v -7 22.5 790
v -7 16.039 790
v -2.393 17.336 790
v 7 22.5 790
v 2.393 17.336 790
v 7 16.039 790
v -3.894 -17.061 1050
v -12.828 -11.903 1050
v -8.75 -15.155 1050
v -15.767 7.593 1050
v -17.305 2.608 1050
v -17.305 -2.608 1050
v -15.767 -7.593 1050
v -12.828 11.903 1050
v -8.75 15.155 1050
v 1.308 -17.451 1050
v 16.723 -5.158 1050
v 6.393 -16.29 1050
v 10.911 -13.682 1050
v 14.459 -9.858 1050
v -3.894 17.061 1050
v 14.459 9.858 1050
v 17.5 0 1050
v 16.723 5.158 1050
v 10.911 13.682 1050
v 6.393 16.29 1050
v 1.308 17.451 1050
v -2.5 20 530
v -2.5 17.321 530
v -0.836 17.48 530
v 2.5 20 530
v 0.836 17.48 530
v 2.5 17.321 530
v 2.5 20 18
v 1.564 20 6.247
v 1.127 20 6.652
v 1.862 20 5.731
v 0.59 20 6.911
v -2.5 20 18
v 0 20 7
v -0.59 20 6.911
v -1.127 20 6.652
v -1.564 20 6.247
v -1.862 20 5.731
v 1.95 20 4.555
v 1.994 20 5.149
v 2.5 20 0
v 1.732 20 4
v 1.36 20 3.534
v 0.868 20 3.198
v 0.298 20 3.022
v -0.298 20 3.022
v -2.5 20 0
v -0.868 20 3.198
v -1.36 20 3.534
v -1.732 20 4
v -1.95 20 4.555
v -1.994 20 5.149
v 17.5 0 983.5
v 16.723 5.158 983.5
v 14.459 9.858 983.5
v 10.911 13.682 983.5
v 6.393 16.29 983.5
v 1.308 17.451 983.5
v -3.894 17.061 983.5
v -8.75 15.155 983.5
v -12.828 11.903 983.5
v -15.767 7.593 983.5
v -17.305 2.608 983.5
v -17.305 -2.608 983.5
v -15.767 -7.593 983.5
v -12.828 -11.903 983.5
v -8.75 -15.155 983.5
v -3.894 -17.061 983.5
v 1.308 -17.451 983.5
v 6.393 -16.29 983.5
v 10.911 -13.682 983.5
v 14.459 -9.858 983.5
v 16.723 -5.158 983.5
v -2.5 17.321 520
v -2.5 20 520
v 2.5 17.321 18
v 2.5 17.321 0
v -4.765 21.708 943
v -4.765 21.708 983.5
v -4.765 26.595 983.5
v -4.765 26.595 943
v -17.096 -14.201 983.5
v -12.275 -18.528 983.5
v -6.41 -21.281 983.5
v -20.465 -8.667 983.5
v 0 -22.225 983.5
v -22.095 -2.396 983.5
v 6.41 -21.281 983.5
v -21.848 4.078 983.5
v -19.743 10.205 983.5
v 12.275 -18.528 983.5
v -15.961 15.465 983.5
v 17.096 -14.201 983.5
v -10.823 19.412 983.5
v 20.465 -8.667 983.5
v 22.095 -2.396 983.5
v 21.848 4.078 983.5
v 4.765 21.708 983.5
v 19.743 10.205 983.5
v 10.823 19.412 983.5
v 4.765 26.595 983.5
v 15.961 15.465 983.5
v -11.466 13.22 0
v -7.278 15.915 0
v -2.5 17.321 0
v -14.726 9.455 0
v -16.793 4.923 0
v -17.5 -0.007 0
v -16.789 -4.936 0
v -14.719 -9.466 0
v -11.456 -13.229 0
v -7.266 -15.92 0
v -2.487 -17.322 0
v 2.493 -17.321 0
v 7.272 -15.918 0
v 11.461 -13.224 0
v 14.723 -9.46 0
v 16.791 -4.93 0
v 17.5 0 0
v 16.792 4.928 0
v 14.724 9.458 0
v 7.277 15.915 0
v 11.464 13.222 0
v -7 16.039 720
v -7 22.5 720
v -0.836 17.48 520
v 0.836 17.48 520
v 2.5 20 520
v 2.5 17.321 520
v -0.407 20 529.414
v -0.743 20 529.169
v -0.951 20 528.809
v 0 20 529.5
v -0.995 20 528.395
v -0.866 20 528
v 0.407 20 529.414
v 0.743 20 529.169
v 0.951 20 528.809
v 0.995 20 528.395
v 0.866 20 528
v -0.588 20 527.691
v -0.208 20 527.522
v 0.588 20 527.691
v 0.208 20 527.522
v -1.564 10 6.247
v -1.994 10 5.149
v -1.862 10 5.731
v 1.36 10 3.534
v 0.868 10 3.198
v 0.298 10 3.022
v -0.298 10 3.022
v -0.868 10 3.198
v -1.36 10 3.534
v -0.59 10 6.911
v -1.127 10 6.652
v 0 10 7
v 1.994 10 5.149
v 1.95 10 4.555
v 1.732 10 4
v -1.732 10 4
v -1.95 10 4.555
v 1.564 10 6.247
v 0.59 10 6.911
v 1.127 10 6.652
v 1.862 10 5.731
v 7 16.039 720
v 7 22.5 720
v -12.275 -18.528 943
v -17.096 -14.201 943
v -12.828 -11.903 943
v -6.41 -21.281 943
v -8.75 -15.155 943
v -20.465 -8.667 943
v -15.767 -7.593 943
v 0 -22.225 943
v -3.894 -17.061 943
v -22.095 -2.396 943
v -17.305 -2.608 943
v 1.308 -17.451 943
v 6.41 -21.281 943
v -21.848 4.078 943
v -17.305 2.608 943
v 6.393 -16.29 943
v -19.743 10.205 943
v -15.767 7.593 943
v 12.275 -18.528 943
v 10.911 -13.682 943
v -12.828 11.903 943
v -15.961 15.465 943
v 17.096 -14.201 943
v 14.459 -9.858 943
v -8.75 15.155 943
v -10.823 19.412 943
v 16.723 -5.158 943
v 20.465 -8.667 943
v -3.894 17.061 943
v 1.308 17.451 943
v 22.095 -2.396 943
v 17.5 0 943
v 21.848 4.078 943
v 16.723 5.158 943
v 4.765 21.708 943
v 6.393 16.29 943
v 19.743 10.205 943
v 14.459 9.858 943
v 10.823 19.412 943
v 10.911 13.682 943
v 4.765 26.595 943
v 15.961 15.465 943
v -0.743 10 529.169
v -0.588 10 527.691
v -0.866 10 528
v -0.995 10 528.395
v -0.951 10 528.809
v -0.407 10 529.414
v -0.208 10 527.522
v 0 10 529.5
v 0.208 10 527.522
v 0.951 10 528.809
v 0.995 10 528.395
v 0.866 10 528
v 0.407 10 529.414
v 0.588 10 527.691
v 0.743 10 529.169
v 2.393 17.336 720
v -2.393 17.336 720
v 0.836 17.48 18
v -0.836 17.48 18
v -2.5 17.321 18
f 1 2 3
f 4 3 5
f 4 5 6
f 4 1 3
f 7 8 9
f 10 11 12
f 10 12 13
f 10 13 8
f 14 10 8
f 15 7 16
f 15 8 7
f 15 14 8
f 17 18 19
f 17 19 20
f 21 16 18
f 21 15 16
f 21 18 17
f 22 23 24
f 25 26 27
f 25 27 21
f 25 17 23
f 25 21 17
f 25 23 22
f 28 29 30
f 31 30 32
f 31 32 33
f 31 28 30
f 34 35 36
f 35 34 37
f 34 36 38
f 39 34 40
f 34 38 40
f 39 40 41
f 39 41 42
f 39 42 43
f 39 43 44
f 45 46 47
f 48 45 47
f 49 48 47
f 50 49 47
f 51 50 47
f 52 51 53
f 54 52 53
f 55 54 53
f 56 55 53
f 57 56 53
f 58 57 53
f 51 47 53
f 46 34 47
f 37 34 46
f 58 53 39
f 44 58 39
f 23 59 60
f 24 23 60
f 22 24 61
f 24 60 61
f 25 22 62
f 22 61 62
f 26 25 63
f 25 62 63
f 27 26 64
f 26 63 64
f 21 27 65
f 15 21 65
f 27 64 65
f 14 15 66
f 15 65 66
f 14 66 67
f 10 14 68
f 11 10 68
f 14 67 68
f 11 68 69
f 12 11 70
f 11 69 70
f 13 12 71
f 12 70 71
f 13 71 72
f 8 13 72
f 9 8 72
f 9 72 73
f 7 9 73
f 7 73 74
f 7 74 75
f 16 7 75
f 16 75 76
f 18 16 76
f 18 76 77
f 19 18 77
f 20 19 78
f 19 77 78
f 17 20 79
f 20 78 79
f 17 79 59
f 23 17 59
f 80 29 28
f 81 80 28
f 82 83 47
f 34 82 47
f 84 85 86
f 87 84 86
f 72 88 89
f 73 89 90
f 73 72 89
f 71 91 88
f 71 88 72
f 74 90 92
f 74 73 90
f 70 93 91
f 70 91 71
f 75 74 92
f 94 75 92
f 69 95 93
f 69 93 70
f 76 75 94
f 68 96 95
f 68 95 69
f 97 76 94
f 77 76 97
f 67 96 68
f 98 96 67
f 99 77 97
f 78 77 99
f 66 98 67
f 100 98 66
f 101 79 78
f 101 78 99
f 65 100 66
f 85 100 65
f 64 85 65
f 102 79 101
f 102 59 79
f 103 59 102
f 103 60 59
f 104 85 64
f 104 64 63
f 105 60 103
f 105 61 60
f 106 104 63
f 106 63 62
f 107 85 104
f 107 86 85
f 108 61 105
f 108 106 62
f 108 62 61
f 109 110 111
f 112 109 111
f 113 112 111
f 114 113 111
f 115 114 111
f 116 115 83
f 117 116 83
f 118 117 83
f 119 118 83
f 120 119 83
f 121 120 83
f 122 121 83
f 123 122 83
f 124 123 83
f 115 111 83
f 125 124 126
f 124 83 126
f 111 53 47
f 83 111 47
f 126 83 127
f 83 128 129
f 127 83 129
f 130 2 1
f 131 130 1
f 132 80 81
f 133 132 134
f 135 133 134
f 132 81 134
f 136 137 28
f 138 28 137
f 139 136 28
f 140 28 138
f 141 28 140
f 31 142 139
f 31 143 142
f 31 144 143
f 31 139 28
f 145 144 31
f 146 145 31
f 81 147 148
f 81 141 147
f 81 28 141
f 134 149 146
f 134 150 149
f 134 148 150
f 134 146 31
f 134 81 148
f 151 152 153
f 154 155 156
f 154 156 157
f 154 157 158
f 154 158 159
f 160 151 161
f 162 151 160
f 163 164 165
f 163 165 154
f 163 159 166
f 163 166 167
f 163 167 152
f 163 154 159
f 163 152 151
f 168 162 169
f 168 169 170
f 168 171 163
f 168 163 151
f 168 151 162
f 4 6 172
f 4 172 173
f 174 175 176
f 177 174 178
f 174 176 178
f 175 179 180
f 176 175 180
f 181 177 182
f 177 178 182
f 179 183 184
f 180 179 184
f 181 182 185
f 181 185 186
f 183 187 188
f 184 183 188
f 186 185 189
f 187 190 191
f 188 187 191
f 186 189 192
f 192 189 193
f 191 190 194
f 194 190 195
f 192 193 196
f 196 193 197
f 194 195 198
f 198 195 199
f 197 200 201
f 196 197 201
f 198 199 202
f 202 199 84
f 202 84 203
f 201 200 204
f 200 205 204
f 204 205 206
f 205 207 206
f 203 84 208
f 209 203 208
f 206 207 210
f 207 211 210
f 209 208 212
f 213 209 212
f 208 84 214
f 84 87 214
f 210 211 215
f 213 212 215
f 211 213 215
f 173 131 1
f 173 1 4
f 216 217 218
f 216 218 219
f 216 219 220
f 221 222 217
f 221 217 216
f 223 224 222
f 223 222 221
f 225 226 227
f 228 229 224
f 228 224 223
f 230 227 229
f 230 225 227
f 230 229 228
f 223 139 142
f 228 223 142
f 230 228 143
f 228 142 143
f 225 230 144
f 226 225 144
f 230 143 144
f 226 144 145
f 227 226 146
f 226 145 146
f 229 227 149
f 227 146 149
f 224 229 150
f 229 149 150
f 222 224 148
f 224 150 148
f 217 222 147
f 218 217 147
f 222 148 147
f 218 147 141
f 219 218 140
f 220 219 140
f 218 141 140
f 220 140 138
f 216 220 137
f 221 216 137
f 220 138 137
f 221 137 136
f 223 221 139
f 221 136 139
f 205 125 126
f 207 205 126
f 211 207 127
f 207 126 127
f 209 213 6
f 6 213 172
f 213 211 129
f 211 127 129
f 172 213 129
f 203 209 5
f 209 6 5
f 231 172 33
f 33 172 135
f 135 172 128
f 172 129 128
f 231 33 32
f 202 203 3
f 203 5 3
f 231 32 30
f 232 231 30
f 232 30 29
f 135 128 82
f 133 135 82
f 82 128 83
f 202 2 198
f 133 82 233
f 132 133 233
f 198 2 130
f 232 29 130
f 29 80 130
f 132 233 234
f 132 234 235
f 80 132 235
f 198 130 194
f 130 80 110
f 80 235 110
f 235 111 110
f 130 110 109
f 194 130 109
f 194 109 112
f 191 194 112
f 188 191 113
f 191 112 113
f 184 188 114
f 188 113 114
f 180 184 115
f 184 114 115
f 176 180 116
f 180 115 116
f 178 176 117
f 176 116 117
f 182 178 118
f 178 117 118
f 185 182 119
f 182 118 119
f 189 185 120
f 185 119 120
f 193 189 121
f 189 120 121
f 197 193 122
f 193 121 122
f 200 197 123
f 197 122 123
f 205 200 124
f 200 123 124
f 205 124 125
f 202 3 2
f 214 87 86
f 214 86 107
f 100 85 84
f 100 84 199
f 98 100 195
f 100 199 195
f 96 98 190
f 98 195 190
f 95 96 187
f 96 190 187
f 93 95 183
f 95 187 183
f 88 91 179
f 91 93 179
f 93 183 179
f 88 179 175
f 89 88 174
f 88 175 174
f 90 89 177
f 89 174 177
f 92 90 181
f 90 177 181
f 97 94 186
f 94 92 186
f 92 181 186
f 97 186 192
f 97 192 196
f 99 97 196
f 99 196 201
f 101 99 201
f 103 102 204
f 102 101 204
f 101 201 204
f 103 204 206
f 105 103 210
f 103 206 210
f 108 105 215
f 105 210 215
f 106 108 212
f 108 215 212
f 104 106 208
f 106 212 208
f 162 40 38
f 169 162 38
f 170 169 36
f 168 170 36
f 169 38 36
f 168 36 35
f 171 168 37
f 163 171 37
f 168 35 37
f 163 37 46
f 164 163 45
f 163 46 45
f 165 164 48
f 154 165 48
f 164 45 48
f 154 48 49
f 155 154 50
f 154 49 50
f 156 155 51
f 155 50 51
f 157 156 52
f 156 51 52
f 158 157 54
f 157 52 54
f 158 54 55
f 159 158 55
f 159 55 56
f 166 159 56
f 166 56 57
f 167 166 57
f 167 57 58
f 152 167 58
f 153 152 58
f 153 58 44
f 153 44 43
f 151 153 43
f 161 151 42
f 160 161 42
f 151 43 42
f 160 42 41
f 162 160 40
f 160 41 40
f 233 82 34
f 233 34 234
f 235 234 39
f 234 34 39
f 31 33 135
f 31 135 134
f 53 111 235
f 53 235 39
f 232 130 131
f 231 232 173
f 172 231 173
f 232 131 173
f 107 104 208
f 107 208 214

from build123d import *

# Parameters (mm, degrees)
SKETCH1_R                = 17.5
BOSS_EXTRUDE1_DEPTH      = 1050
BOSS_EXTRUDE2_DEPTH      = 5
BOSS_EXTRUDE2_DEPTH_BACK = 5
SKETCH2_W                = 5
SKETCH2_H                = 5
BOSS_EXTRUDE3_START      = -40.50047623
SKETCH5_R                = 17.5
SKETCH5_R_2              = 11.1125
BOSS_EXTRUDE3_DEPTH      = 40.50047623
SKETCH7_R                = 22.225
BOSS_EXTRUDE4_DEPTH      = 40.50047623
SKETCH11_W               = 9.53
SKETCH11_H               = 8.74
BOSS_EXTRUDE5_DEPTH      = 40.50047623
SKETCH12_W               = 5
SKETCH12_H               = 5
BOSS_EXTRUDE6_DEPTH      = 18
SKETCH13_R               = 2
CUT_EXTRUDE1_DEPTH       = 10
SKETCH15_R               = 1
CUT_EXTRUDE3_DEPTH       = 10
SKETCH16_W               = 14
SKETCH16_H               = 10
BOSS_EXTRUDE7_DEPTH      = 70


with BuildPart() as part:
    # Sketch1 → Boss-Extrude1 (new body)
    with BuildSketch(Plane.XY):
        Circle(SKETCH1_R)
    extrude(amount=BOSS_EXTRUDE1_DEPTH)

    # Sketch2 → Boss-Extrude2 (add, two sides: drawn at the far end of the back side and taken through both)
    with BuildSketch(Plane.XY.offset(525).offset(-BOSS_EXTRUDE2_DEPTH_BACK)):
        with Locations((0, 17.5)):
            Rectangle(SKETCH2_W, SKETCH2_H)
    extrude(amount=BOSS_EXTRUDE2_DEPTH + BOSS_EXTRUDE2_DEPTH_BACK)

    # Sketch5 → Boss-Extrude3 (add)
    with BuildSketch(Plane.XY.offset(1050).offset(BOSS_EXTRUDE3_START)):
        Circle(SKETCH5_R)
        Circle(SKETCH5_R_2, mode=Mode.SUBTRACT)
    extrude(amount=BOSS_EXTRUDE3_DEPTH)

    # Sketch7 → Boss-Extrude4 (add)
    with BuildSketch(Plane.XY.offset(943)):
        Circle(SKETCH7_R)
    extrude(amount=BOSS_EXTRUDE4_DEPTH)

    # Sketch11 → Boss-Extrude5 (add)
    with BuildSketch(Plane.XY.offset(983.50047623)):
        with Locations((0, 22.225)):
            Rectangle(SKETCH11_W, SKETCH11_H)
    extrude(amount=-BOSS_EXTRUDE5_DEPTH)

    # Sketch12 → Boss-Extrude6 (add)
    with BuildSketch(Plane(origin=(0, 0, 0), x_dir=(-1, 0, 0), z_dir=(0, 0, -1))):
        with Locations((0, 17.5)):
            Rectangle(SKETCH12_W, SKETCH12_H)
    extrude(amount=-BOSS_EXTRUDE6_DEPTH)

    # Sketch13 → Cut-Extrude1 (cut)
    with BuildSketch(Plane(origin=(0, 20, 0), x_dir=(1, 0, 0), z_dir=(0, 1, 0))):
        with Locations(Location((0, -5, 0), (0, 0, 270))):
            Circle(SKETCH13_R)
    extrude(amount=-CUT_EXTRUDE1_DEPTH, mode=Mode.SUBTRACT)

    # Sketch15 → Cut-Extrude3 (cut)
    with BuildSketch(Plane(origin=(0, 20, 0), x_dir=(1, 0, 0), z_dir=(0, 1, 0))):
        with Locations(Location((0, -528.5, 0), (0, 0, 270))):
            Circle(SKETCH15_R)
    extrude(amount=-CUT_EXTRUDE3_DEPTH, mode=Mode.SUBTRACT)

    # Sketch16 → Boss-Extrude7 (add)
    with BuildSketch(Plane.XY.offset(790)):
        with Locations((0, 17.5)):
            Rectangle(SKETCH16_W, SKETCH16_H)
    extrude(amount=-BOSS_EXTRUDE7_DEPTH)


solid = part.part
